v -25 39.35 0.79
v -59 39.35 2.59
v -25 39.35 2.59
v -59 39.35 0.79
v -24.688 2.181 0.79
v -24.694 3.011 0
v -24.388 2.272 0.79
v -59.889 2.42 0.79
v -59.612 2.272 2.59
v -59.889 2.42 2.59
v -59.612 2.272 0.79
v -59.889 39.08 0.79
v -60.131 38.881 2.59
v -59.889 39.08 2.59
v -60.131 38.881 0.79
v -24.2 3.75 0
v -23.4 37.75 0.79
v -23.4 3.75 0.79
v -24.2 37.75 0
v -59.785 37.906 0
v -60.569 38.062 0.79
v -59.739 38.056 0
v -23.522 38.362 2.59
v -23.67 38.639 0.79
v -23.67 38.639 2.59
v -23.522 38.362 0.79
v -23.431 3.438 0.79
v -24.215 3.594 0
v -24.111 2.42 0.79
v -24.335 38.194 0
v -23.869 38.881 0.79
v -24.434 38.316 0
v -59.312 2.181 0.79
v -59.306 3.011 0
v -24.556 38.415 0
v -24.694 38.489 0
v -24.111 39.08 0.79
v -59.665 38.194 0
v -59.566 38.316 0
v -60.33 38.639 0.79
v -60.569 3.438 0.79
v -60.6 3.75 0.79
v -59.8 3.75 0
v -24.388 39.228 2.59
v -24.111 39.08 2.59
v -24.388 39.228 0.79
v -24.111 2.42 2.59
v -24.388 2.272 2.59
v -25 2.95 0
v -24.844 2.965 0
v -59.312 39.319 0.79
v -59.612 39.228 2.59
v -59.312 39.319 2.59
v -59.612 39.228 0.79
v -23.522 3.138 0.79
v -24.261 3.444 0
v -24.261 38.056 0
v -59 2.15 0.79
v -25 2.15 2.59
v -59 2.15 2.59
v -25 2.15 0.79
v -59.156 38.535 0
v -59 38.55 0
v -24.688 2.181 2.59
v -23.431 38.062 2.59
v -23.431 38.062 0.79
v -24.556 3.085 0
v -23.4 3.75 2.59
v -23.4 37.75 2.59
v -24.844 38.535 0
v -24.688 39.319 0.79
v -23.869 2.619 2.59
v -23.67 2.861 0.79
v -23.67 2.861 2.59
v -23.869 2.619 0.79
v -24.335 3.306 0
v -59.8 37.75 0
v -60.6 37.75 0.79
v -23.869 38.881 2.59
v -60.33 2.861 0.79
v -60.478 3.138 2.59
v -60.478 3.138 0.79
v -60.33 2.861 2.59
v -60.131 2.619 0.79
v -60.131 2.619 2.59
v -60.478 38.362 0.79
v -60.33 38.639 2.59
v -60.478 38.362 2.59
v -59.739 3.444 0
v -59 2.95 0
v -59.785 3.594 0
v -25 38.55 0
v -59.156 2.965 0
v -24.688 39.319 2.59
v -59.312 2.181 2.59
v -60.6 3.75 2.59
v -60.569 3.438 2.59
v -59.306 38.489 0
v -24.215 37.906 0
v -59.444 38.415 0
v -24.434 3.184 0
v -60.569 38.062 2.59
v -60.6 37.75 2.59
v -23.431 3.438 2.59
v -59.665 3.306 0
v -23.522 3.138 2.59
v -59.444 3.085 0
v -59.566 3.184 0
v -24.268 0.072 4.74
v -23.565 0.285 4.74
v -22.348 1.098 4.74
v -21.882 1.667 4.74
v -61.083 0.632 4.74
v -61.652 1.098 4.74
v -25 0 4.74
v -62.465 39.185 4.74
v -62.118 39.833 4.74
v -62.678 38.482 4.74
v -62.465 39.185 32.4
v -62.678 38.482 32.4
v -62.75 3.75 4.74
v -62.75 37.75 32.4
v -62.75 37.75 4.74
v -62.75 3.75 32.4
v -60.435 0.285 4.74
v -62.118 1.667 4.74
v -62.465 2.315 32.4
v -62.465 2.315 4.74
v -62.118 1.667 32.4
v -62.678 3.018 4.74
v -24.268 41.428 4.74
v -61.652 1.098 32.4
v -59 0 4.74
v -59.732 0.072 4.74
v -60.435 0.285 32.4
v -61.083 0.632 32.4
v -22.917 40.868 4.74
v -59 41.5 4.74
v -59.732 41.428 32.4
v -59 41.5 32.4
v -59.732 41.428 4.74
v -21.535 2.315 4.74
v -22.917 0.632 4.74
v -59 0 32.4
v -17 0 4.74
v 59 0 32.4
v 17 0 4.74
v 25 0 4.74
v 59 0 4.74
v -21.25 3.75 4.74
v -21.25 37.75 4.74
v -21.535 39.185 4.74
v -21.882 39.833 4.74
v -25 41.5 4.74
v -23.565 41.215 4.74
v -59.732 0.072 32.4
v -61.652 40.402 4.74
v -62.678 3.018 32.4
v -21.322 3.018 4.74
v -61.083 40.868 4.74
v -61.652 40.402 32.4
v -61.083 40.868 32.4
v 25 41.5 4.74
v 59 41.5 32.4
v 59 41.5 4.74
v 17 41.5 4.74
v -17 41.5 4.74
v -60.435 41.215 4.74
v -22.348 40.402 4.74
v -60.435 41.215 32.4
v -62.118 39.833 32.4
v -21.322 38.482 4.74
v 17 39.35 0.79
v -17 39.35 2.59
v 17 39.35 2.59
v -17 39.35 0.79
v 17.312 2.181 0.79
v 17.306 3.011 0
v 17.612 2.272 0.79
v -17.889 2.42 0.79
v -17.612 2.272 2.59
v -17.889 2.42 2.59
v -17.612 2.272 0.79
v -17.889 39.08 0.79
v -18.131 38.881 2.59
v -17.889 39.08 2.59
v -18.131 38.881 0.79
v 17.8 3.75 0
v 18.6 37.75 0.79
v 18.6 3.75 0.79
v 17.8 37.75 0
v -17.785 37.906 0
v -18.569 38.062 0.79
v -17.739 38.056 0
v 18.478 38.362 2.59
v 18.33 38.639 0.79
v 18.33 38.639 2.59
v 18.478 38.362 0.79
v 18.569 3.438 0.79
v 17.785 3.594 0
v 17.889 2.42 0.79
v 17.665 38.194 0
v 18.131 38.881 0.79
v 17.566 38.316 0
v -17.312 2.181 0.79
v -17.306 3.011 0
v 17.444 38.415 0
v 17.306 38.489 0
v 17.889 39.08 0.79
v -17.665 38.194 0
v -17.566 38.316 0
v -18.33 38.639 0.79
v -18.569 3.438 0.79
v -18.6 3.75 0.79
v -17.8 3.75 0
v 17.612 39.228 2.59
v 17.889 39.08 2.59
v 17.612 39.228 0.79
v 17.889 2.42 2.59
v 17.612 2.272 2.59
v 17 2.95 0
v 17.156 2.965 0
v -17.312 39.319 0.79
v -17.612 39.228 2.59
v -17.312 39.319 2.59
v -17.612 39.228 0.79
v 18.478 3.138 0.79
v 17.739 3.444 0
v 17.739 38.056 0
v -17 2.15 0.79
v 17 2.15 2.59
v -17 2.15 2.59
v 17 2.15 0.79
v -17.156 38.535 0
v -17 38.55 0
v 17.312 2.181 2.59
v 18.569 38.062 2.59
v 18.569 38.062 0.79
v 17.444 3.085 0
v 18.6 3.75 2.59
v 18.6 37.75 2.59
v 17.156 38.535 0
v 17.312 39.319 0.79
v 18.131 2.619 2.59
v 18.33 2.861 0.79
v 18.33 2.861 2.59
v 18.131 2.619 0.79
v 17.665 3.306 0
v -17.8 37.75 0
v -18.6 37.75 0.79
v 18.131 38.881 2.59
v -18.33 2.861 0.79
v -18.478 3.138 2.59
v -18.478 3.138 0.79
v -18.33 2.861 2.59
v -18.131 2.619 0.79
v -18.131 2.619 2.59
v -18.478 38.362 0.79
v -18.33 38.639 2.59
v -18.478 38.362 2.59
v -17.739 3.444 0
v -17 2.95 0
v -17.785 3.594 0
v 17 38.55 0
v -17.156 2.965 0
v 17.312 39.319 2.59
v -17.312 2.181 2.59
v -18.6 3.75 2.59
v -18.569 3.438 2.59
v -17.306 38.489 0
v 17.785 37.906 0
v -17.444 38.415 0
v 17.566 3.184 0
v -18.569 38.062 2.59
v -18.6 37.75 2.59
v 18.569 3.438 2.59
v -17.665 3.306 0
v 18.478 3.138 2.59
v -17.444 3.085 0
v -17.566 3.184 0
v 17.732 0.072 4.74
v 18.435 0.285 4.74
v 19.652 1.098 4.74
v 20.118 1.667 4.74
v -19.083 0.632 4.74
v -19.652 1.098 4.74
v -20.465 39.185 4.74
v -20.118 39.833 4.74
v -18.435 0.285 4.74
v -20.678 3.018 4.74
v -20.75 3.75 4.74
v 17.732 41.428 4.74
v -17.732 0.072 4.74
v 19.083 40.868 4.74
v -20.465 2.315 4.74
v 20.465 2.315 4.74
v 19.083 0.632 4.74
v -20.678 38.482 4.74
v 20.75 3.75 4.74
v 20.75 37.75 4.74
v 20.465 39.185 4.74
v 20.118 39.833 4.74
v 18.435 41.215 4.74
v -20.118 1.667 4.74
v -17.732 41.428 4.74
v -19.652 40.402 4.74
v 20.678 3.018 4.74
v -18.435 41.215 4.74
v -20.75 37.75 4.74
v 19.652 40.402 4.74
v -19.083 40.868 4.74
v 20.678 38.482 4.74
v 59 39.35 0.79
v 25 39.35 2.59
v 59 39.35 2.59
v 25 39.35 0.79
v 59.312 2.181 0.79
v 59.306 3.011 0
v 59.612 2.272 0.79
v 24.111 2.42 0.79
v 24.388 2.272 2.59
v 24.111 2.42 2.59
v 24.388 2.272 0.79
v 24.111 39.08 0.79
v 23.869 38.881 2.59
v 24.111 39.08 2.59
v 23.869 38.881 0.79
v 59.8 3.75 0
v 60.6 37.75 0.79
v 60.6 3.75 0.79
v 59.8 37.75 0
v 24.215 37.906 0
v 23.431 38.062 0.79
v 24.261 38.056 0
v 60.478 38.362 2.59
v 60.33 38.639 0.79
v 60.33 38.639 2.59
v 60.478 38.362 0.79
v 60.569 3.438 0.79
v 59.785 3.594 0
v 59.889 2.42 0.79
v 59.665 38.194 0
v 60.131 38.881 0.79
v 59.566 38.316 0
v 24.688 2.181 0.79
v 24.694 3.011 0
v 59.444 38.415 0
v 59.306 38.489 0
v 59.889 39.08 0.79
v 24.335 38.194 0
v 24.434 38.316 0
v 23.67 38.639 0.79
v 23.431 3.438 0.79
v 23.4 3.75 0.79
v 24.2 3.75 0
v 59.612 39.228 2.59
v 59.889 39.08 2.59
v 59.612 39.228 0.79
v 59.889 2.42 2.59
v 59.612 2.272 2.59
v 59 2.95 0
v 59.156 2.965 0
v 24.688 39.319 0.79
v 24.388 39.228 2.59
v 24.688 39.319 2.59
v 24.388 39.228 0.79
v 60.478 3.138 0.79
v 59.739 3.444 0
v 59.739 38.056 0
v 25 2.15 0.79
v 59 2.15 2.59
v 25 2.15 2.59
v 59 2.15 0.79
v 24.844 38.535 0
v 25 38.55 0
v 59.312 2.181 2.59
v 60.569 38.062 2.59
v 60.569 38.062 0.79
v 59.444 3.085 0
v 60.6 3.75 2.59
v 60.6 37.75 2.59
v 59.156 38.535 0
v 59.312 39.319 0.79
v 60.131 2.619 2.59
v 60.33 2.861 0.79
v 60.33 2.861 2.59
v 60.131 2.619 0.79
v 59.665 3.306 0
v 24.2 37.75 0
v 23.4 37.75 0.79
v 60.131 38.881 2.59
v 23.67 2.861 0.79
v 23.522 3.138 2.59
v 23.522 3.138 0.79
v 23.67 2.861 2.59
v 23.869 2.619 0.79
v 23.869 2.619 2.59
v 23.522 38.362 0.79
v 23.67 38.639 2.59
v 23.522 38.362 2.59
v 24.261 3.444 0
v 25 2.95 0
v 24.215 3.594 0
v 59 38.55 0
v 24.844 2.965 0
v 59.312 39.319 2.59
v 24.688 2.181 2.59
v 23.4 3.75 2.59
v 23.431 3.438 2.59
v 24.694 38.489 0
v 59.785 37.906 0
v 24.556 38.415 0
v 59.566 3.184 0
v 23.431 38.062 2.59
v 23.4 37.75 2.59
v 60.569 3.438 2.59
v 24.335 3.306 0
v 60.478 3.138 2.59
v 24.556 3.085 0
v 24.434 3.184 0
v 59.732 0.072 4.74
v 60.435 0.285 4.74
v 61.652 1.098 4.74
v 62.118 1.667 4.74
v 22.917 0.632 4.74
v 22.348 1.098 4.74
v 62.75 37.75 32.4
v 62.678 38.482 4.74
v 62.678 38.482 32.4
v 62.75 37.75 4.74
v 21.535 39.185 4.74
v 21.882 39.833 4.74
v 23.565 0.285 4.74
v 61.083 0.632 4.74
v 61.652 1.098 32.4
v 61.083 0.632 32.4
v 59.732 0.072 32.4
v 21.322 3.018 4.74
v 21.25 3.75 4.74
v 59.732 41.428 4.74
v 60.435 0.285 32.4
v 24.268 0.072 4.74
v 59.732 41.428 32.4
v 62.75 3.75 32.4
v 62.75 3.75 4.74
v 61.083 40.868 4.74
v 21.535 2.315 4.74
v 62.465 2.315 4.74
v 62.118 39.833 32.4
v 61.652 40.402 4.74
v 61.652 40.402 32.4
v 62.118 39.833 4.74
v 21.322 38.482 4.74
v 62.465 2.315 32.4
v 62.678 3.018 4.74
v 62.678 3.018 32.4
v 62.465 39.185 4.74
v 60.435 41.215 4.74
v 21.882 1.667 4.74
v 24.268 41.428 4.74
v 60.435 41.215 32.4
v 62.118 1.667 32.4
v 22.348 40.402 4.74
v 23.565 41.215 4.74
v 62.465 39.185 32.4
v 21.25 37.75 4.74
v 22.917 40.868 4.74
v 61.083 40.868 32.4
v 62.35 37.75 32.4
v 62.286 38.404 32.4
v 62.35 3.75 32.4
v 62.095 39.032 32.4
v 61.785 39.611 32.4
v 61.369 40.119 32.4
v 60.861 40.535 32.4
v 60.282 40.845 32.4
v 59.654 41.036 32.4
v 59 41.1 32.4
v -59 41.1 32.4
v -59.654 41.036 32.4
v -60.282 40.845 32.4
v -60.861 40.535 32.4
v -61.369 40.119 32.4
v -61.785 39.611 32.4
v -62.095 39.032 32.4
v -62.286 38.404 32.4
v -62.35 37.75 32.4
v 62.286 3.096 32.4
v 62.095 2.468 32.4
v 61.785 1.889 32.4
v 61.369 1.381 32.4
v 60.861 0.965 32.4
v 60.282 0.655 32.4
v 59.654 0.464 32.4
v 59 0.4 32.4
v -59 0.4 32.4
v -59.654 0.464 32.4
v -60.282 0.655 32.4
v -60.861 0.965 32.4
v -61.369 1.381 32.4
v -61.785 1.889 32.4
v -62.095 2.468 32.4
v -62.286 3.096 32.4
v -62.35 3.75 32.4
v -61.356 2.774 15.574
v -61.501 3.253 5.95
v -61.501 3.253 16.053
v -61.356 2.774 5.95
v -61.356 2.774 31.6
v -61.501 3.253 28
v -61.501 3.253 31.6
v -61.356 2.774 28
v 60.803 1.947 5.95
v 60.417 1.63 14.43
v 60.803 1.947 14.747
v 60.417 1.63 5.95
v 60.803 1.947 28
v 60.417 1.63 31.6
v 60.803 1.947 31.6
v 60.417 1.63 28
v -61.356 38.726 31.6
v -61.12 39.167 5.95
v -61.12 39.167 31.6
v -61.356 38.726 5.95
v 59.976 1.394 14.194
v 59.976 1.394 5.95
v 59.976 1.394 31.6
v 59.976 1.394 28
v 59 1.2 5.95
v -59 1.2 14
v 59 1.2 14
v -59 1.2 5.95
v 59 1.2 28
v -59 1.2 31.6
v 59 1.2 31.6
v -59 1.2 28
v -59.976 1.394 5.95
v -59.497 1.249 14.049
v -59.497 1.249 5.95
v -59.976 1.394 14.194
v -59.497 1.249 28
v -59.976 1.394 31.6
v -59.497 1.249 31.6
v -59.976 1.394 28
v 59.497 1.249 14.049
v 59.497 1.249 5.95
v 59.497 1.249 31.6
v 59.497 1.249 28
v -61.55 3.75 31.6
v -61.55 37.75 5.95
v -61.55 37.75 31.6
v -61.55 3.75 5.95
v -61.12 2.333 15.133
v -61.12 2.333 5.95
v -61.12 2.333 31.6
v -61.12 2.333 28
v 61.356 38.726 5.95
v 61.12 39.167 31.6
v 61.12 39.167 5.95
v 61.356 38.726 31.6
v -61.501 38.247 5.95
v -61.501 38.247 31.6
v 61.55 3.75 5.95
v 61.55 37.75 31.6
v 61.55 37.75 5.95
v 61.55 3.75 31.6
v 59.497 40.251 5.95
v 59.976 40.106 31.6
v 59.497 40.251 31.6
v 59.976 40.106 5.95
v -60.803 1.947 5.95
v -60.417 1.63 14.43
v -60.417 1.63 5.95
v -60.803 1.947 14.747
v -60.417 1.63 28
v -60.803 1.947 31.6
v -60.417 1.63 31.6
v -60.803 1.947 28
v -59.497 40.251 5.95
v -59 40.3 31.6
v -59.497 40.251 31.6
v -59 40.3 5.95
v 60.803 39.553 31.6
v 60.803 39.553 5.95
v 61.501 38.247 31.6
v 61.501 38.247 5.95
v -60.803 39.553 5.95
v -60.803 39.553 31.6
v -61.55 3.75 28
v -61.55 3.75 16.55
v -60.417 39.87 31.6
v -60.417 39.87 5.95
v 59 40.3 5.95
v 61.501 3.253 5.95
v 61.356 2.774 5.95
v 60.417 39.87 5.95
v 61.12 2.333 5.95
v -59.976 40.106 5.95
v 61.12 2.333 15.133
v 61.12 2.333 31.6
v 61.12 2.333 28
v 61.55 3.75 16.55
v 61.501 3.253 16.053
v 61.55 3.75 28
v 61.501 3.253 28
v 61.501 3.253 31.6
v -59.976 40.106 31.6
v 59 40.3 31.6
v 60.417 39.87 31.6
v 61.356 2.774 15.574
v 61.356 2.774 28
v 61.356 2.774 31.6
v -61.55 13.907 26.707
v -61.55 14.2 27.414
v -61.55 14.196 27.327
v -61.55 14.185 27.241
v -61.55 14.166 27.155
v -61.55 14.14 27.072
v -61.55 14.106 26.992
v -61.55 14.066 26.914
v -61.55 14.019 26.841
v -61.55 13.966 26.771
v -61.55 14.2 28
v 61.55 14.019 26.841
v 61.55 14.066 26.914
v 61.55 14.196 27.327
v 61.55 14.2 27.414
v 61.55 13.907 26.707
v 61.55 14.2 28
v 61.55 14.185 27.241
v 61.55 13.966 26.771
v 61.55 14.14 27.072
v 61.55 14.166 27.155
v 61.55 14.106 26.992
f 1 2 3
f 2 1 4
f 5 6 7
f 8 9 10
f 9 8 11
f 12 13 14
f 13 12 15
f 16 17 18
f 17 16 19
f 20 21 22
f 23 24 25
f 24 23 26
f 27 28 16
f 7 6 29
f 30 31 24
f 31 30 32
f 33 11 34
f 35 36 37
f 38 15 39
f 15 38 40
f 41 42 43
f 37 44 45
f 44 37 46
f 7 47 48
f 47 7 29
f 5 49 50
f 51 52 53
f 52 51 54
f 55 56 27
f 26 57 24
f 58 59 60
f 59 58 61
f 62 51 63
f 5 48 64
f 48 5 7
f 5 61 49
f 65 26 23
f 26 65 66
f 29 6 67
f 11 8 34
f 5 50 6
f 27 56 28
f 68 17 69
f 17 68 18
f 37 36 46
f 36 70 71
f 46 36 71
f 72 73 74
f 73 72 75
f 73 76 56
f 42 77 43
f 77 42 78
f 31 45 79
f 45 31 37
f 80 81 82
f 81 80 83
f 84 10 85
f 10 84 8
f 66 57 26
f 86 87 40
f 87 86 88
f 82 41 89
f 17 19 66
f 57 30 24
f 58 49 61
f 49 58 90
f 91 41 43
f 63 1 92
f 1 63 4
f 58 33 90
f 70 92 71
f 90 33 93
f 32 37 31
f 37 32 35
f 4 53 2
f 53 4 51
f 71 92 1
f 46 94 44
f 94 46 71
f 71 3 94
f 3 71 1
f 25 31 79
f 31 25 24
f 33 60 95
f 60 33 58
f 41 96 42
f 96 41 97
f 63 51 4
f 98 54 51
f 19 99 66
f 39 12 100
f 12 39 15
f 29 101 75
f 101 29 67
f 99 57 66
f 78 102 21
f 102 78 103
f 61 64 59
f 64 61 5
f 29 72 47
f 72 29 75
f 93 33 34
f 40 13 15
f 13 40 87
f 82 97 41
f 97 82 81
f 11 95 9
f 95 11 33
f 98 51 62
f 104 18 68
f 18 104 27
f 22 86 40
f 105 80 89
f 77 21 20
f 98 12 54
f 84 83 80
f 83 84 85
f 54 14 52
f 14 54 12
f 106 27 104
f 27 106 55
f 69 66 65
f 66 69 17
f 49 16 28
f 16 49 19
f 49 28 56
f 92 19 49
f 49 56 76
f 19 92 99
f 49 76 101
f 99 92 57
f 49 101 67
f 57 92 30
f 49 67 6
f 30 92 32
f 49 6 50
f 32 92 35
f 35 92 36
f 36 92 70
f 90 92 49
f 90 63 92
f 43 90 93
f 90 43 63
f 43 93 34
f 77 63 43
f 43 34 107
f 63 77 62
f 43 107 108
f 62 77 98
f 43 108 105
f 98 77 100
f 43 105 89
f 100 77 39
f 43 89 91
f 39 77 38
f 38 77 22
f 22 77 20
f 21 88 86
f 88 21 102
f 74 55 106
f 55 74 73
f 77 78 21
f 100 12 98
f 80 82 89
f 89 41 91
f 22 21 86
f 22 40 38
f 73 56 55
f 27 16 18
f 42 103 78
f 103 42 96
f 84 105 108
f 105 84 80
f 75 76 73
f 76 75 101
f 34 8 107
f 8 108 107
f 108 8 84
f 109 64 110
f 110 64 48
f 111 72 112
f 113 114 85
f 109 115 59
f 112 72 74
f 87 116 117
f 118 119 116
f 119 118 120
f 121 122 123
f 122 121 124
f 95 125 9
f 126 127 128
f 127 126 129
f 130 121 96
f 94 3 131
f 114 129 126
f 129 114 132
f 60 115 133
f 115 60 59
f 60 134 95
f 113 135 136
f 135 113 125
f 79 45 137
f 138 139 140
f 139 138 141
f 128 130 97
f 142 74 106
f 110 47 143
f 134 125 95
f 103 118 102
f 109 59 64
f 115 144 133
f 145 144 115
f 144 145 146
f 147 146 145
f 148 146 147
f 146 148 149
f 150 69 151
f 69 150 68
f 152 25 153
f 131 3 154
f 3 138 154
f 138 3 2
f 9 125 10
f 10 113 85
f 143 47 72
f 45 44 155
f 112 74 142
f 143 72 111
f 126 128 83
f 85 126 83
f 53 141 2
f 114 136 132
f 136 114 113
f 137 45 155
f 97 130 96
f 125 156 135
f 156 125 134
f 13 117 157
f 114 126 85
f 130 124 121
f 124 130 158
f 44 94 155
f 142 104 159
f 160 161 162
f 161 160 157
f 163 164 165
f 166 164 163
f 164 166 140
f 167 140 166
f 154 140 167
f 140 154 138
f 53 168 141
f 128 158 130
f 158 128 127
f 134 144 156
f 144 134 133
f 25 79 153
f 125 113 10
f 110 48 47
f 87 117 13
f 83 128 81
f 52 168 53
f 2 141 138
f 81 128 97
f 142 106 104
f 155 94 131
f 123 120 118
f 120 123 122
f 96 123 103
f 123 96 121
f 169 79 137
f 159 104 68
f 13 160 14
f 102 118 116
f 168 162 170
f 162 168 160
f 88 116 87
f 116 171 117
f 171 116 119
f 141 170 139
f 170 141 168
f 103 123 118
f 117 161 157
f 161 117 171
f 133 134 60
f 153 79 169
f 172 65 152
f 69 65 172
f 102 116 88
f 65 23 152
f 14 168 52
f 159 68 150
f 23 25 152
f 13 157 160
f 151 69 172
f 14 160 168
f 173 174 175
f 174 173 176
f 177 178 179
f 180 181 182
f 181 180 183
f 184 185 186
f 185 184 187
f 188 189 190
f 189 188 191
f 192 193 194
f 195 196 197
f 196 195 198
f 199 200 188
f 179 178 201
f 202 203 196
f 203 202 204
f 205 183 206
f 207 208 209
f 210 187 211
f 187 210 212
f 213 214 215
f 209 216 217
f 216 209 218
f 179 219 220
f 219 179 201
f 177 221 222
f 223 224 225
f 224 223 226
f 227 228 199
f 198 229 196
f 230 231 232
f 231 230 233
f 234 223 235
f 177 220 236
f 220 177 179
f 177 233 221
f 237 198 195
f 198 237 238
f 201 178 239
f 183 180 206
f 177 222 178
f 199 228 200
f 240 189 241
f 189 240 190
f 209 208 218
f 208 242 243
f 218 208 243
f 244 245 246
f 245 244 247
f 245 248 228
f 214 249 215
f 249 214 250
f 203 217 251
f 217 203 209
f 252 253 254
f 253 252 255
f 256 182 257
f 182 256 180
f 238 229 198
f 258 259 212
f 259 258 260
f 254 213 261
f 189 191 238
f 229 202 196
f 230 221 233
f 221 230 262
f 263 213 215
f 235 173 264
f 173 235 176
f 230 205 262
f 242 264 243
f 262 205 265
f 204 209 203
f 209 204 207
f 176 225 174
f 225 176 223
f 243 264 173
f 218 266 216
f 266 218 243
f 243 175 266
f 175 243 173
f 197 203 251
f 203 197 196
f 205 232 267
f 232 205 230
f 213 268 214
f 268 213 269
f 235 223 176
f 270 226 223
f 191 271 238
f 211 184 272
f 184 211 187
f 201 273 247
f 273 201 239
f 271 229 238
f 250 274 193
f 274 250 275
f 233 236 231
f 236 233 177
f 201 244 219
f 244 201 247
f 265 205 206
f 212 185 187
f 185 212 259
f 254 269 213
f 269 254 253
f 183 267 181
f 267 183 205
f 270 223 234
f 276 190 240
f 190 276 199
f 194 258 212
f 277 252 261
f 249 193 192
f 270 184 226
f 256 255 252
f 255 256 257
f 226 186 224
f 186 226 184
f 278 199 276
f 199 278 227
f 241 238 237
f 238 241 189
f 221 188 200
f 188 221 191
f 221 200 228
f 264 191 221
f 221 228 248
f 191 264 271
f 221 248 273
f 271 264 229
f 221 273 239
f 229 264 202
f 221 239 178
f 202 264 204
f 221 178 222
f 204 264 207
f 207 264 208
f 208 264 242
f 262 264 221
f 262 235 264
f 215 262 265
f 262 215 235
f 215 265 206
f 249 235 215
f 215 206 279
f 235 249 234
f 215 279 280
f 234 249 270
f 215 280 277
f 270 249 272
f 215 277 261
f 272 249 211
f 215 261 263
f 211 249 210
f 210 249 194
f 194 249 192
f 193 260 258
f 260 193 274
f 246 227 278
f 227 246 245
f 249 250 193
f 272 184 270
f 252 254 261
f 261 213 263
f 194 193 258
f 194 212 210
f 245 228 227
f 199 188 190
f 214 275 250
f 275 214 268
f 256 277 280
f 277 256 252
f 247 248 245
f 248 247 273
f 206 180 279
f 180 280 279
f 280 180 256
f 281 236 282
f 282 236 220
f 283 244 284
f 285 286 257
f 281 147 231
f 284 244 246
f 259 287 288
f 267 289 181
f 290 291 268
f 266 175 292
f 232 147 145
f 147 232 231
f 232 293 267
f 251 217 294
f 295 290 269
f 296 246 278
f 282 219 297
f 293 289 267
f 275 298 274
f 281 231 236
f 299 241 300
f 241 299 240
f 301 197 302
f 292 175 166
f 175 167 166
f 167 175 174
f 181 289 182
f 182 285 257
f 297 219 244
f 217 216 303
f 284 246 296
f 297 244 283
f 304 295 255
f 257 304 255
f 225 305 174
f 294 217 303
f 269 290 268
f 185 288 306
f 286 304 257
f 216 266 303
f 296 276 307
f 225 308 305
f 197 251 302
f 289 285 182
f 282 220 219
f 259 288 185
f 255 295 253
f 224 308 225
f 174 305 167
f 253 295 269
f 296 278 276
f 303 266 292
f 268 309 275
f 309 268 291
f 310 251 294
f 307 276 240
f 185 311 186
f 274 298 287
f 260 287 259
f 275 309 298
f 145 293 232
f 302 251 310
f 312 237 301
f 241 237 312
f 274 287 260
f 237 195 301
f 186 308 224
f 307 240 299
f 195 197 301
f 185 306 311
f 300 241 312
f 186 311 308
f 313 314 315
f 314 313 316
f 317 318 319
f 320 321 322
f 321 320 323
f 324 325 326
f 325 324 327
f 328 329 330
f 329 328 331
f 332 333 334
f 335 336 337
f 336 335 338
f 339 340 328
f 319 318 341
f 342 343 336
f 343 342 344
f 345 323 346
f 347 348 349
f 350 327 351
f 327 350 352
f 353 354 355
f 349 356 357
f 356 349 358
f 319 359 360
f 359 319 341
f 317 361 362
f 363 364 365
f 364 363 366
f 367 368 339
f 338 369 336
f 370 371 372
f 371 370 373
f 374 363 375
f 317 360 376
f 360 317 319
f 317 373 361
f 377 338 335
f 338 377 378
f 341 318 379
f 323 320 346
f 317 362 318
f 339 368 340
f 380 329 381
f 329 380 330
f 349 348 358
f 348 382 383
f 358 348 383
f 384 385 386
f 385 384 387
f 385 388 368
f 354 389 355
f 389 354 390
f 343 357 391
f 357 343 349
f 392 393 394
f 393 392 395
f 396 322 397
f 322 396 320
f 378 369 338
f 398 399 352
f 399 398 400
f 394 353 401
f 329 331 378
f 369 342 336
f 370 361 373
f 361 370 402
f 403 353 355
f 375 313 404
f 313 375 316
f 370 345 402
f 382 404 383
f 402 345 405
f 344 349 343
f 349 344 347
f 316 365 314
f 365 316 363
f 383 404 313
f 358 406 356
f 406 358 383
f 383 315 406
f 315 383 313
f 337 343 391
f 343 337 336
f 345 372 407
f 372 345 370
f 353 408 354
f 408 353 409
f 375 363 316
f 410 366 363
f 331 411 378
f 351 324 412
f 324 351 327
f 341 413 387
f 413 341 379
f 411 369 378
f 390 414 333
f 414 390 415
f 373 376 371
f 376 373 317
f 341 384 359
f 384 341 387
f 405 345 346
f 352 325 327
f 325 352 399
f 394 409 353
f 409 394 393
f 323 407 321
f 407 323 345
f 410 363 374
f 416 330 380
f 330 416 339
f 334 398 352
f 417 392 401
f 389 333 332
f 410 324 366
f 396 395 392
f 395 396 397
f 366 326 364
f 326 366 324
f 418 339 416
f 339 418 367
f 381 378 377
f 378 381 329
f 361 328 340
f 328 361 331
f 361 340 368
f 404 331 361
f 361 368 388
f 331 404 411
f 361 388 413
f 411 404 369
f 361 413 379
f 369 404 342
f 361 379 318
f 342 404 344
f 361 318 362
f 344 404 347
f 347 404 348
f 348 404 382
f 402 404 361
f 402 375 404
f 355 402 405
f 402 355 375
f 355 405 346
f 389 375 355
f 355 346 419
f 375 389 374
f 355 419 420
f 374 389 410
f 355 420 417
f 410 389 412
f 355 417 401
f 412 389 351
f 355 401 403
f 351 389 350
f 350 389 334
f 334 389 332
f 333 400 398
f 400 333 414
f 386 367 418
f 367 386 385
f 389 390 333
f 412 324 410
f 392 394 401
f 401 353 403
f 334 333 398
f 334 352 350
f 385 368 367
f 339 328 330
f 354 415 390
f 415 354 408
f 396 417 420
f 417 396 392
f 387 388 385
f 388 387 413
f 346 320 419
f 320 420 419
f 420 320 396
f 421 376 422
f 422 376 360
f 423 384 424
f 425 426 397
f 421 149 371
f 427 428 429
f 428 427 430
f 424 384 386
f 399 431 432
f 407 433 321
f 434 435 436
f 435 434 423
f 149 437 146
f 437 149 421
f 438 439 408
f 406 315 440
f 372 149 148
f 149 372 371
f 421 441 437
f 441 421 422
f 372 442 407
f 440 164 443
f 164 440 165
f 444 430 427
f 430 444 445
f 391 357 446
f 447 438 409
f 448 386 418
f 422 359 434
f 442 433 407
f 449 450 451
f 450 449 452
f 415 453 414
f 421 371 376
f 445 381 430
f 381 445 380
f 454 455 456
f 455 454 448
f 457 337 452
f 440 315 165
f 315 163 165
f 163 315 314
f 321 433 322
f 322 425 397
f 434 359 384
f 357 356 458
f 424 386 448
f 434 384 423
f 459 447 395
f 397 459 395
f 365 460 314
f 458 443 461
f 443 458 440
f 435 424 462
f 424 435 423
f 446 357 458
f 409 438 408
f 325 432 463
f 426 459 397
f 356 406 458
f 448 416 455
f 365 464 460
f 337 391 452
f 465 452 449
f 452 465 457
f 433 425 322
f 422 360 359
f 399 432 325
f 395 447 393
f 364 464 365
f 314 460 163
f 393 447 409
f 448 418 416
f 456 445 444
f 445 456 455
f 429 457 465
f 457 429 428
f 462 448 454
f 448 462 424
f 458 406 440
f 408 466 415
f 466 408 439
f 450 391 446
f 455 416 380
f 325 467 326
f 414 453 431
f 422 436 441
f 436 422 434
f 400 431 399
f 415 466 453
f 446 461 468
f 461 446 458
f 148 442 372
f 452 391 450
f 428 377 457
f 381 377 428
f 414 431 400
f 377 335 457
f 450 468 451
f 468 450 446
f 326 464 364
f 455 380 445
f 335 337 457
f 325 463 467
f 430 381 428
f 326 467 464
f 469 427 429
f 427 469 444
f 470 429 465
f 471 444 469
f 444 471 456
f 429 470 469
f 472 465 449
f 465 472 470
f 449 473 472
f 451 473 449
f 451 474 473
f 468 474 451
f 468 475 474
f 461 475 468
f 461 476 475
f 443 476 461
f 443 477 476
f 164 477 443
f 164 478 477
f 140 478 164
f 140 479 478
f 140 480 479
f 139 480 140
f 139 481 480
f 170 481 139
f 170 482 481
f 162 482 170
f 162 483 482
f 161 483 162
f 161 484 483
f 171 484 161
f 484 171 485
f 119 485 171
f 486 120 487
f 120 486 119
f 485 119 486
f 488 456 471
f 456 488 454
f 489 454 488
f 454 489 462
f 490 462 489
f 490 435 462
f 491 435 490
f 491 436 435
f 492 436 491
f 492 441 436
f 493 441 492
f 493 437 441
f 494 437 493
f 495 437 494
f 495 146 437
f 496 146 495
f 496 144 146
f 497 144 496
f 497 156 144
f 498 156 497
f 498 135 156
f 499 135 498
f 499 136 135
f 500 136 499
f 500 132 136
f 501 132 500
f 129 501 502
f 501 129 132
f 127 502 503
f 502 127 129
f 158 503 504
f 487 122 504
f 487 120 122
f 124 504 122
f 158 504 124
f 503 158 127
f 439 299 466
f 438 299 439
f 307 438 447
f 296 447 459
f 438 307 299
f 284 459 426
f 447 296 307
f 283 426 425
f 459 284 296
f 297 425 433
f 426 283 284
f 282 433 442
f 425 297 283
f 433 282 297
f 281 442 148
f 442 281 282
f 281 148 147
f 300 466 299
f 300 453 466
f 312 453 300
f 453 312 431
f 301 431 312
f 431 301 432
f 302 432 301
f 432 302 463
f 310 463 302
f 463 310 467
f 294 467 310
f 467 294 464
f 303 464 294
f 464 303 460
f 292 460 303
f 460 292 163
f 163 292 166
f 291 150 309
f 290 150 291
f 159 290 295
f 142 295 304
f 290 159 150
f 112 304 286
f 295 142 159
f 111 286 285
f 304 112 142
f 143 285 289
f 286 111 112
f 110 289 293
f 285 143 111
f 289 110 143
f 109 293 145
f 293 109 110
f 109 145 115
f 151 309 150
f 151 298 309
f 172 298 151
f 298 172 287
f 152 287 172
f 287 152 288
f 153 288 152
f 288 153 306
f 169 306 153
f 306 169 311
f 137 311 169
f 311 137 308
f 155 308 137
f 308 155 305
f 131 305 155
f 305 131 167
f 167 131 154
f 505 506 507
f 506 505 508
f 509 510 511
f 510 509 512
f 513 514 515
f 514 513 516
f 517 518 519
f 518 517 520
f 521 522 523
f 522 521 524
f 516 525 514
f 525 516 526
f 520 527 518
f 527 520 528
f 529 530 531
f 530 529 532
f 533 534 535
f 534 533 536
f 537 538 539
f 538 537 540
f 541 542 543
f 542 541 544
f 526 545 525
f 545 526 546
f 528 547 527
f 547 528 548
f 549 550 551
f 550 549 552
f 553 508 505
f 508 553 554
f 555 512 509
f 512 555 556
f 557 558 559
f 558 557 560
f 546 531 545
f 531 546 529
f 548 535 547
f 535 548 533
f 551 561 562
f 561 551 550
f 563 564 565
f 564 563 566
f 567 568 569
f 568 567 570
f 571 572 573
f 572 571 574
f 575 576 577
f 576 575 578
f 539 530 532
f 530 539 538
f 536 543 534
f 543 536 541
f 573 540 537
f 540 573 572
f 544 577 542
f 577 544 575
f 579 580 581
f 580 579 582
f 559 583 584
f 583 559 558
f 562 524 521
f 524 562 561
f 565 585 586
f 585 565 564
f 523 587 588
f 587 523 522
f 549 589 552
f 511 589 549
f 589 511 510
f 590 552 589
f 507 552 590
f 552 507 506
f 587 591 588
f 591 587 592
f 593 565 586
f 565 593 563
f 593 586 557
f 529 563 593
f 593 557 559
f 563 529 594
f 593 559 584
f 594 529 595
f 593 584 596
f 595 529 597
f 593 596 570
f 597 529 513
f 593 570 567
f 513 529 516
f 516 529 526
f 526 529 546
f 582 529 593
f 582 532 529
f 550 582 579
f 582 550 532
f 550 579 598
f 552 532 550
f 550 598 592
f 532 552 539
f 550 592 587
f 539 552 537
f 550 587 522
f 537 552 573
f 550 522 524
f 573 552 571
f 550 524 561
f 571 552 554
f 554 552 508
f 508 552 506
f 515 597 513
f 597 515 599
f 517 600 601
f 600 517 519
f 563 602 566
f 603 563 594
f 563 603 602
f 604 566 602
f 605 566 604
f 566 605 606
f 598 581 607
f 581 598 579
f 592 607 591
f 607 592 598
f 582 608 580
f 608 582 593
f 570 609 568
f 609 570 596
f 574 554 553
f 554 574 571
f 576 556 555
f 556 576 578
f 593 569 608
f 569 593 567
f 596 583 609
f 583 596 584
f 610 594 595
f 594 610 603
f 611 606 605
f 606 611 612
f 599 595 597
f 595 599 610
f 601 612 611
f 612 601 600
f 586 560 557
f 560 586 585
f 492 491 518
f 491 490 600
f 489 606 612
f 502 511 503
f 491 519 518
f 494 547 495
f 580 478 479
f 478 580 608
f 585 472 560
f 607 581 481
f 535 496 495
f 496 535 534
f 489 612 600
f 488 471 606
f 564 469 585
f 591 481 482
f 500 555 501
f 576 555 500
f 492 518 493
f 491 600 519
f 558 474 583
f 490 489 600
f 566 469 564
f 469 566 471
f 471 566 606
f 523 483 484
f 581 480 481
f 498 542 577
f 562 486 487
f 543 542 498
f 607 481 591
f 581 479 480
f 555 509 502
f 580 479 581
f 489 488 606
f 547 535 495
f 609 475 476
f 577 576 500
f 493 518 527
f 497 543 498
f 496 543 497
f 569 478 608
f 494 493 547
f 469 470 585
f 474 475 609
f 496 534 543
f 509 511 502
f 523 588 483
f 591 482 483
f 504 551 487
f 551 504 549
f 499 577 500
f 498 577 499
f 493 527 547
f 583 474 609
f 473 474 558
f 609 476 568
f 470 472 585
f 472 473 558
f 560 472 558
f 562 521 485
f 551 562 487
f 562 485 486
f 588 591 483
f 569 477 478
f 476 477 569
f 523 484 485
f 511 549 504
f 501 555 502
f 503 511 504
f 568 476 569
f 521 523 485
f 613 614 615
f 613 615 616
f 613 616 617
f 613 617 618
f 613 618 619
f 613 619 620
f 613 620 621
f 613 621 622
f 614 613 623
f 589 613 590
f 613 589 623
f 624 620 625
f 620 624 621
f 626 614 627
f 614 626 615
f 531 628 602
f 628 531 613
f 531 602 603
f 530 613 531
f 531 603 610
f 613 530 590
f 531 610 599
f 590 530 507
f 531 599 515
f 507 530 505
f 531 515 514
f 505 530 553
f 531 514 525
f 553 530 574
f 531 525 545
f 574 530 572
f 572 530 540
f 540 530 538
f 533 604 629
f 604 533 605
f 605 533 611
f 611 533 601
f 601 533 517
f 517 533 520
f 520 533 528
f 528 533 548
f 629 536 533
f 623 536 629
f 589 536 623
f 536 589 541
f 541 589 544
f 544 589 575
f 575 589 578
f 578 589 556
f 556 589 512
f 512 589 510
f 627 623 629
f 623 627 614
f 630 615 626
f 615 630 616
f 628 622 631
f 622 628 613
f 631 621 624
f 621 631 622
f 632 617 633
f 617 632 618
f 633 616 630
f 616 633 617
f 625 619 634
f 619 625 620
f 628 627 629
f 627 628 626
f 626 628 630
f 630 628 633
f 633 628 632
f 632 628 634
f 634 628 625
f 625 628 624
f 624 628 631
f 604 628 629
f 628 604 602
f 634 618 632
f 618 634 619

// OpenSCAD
// file: ../../../modules/gridfinity.scad
// Gridfinity ベースプレートの共有 module。
// 寸法は Gridfinity 仕様 (Zack Freedman) の baseplate 輪郭に従う:
//   ピッチ 42、ソケット上端開口 41.5 (角 R4)、上から 45° 面取り 2.15 →
//   垂直 1.8 (37.2 角・R1.85) → 45° 面取り 0.7 → 底 35.8 角 (R1.15)。
//   ソケット深さ = 2.15 + 1.8 + 0.7 = 4.65。
//
// 座標系: X が列方向 (中央が 0)、Y が行方向 (板の前端が 0)、Z=0 が板の底面。
// 板の外形は grid とは独立に rim で与えるので、grid より大きい板 (縁付き) を
// 作れる。ソケットは rim=[left, right, front, back] の内側へ 42 ピッチで並ぶ。

gf_pitch = 42;
gf_socket_top = 41.5; // 上端開口
gf_socket_mid = 37.2; // 垂直部
gf_socket_bot = 35.8; // 底
gf_socket_r_top = 4;
gf_socket_r_mid = 1.85;
gf_socket_r_bot = 1.15;
gf_chamfer_top = 2.15;
gf_wall_h = 1.8;
gf_chamfer_bot = 0.7;
gf_socket_depth = gf_chamfer_top + gf_wall_h + gf_chamfer_bot; // 4.65
gf_fn = 32;
gf_eps = 0.01; // hull 用の薄板の厚さ
gf_over = 0.5; // 切削の抜き代

// 角丸正方形または矩形 (w は一辺、または [幅, 奥行き]、角 R)
module
gf_rounded_square(w, r)
{
    offset(r = r, $fn = gf_fn)
        square(is_list(w) ? w - [ 2 * r, 2 * r ] : w - 2 * r, center = true);
}

// 厚さ gf_eps の角丸正方形の薄板を z に置く (hull の骨)
module
gf_slab(w, r, z)
{
    translate([ 0, 0, z ]) linear_extrude(gf_eps) gf_rounded_square(w, r);
}

// ソケット1個の切削体。z=0 がソケットの底 (床の天面)、+Z へ 4.65 で天面に出る。
// clearance は嵌合の逃げで、輪郭を全周へ clearance だけ外へ出す (幅 +2c、角 R
// +c)。pitch_x は X 方向のセル幅。端数でも角 R と面取りの寸法を保つ。
module
gf_socket_cut(clearance = 0, pitch_x = gf_pitch)
{
    z1 = gf_chamfer_bot;
    z2 = z1 + gf_wall_h;
    z3 = gf_socket_depth;
    c = clearance;
    assert(pitch_x > gf_pitch - gf_socket_top + 2 * gf_socket_r_top,
           "Cell width is too small for the socket corner radius");
    delta = [ pitch_x - gf_pitch, 0 ];
    bot = [ gf_socket_bot + 2 * c, gf_socket_bot + 2 * c ] + delta;
    mid = [ gf_socket_mid + 2 * c, gf_socket_mid + 2 * c ] + delta;
    top = [ gf_socket_top + 2 * c, gf_socket_top + 2 * c ] + delta;
    hull()
    {
        gf_slab(bot, gf_socket_r_bot + c, 0);
        gf_slab(mid, gf_socket_r_mid + c, z1 - gf_eps);
    }
    hull()
    {
        gf_slab(mid, gf_socket_r_mid + c, z1 - gf_eps);
        gf_slab(mid, gf_socket_r_mid + c, z2 - gf_eps);
    }
    hull()
    {
        gf_slab(mid, gf_socket_r_mid + c, z2 - gf_eps);
        gf_slab(top, gf_socket_r_top + c, z3 - gf_eps);
    }
    // 天面より上へ抜く (天面と同一平面の退化した面を残さない)
    gf_slab(top, gf_socket_r_top + c, z3 - gf_eps);
    translate([ 0, 0, z3 - gf_eps ]) linear_extrude(gf_over + gf_eps)
        gf_rounded_square(top, gf_socket_r_top + c);
}

// ベースプレート。cols x rows のソケットを床 floor_t の上に彫る。
// rim = [left, right, front, back] はソケット列の外側に残す縁の幅。
// 板の幅 = cols*42 + left + right、奥行き = rows*42 + front + back。
// cols の端数は左端の細幅セルになる。rows は正の整数。
// clearance はソケットの嵌合の逃げ (gf_socket_cut を参照)。
module
gf_baseplate(cols, rows, rim = [ 0, 0, 0, 0 ], floor_t = 1, clearance = 0)
{
    grid_w = cols * gf_pitch;
    grid_d = rows * gf_pitch;
    plate_w = grid_w + rim[0] + rim[1];
    plate_d = grid_d + rim[2] + rim[3];
    x0 = -plate_w / 2 + rim[0]; // ソケット列の左端
    first_pitch = grid_w - (ceil(cols) - 1) * gf_pitch;
    difference()
    {
        translate([ -plate_w / 2, 0, 0 ])
            cube([ plate_w, plate_d, floor_t + gf_socket_depth ]);
        for (c = [0:ceil(cols) - 1], r = [0:rows - 1])
            translate([
                x0 + (c == 0 ? first_pitch / 2
                             : first_pitch + (c - 0.5) * gf_pitch),
                rim[2] + (r + 0.5) * gf_pitch,
                floor_t
            ]) gf_socket_cut(clearance, c == 0 ? first_pitch : gf_pitch);
    }
}
// file: ../../../modules/gridfinity_bins.scad
include <gridfinity_bin.scad>

// assets/gridfinity-bin/ の bin 群の共通値と、サイズ 3 引数の払い出し口。
// 単体では何も描かない。設計の経緯と確定値は
// ledger/designs/gridfinity-bin-4u.md が正本。
// 通常binは4U/9U、X={1,1.5,2,2.5,3} × Y={1,2,3,4,5,5.5}。
// 両軸に端数を持つ組み合わせはassetに置かない（各高さ28種）。
// Xが横、Yがラベルの壁から奥、unitsが高さ（7mm単位）。
wall = 1.2;    // 0.4 ノズル 3 本
floor_t = 1.2; // 底 (4.75) の上に載せる床。床の天面 z = 5.95
label_d = 13;  // 12mm 幅のラベルシールを貼る天板の張り出し
label_t = 1; // 天板の厚さ (user 指定)。下は 45° の無垢のくさび
label_r = 1; // 天板の先端と 45° 面の境目の R (user 指定)
// カードケース (goods/card_case_2x3x4u.scad) の値。カードは ISO/IEC 7810 ID-1 (85.6 × 54 ×
// 0.76、隅 R3) で、長辺を Y (rows 方向) に寝かせ、X 中央・手前の壁から 10 奥に置く。ポケットは
// カードより 1 大きい (片側 0.5)。右奥のマスは壁の内面まで抜き、床と底を外形に平行な 45° の窪みにする。
// ポケットの左右の埋めの天面 (幅 13.05) が 12mm のラベルを貼る帯。ポケットと穴の交点の
// 縦エッジは丸める (開口の上縁は丸めない: 壁を上端まで垂直に保ち、収まる枚数を減らさない)
card_w = 54;    // カードの短辺 (X)。user 指定「高さ 54」
card_d = 85.6;  // カードの長辺 (Y)。user 指定「幅 85.6」
card_clear = 1; // ポケットの余裕 (user 指定「+1mm」)
// ポケットの手前の辺の、手前の壁の内面からの距離 (user 指定「10mm」)
card_off = 10;
// ポケットの平面の隅 R (user 指定「角の丸み 3mm」。ID-1 の隅は 2.88..3.48)
card_r = 3;
// ポケットと穴が交わる所の、埋めの凸の縦エッジの R (指の当たる角)
card_edge_r = 2;
recess_skin = floor_t + 1.75; // 窪みの床 z (底の皮)。user 指定「壁厚と同じ 1.2 は過剰、1.75 返す」

function bin_contract(cols, rows, units) = str("CONTRACT units=",
                                               units,
                                               " pitch=",
                                               gf_pitch,
                                               " outer=",
                                               gfb_outer,
                                               " h=",
                                               units* gfb_unit,
                                               " lip=",
                                               gfb_lip_h,
                                               " base=",
                                               gfb_base_bot,
                                               "/",
                                               gfb_base_mid,
                                               "/",
                                               gfb_outer,
                                               " base_h=",
                                               gfb_base_h,
                                               " wall=",
                                               wall,
                                               " floor_top=",
                                               gfb_base_h + floor_t,
                                               " label=",
                                               label_d,
                                               "x",
                                               label_t,
                                               " wedge=45 fillet=",
                                               label_r,
                                               " bin=",
                                               cols,
                                               "x",
                                               rows,
                                               " size=",
                                               cols* gf_pitch - 0.5,
                                               "x",
                                               rows* gf_pitch - 0.5);

// (cols, rows, units) でラベル付き bin を払い出す。例: gridfinity_bin(2, 4, 4)
module
gridfinity_bin(cols, rows, units = 4)
{
    echo(bin_contract(cols, rows, units));
    gfb_bin(cols, rows, units, wall, floor_t, label_d, label_t, label_r);
}

function card_contract(cols, rows, units) = str("CONTRACT card units=",
                                                units,
                                                " bin=",
                                                cols,
                                                "x",
                                                rows,
                                                " size=",
                                                cols* gf_pitch - 0.5,
                                                "x",
                                                rows* gf_pitch - 0.5,
                                                " h=",
                                                units* gfb_unit,
                                                " lip=",
                                                gfb_lip_h,
                                                " floor_top=",
                                                gfb_base_h + floor_t,
                                                " card=",
                                                card_w,
                                                "x",
                                                card_d,
                                                " pocket=",
                                                card_w + card_clear,
                                                "x",
                                                card_d + card_clear,
                                                " at=",
                                                -(card_w + card_clear) / 2,
                                                ",",
                                                wall + card_off,
                                                " hole=",
                                                (cols - 1) / 2 * gf_pitch - gfb_outer / 2,
                                                ",",
                                                (rows - 0.5) * gf_pitch - 0.25 - gfb_outer / 2,
                                                " hole_r=",
                                                gfb_outer_r - wall,
                                                " recess=",
                                                gfb_outer - 2 * wall,
                                                "/",
                                                gfb_base_mid - 2 * wall,
                                                " recess_floor=",
                                                recess_skin,
                                                " r=",
                                                card_r,
                                                " edge_r=",
                                                card_edge_r);

// (cols, rows, units) でカードケースを払い出す。例: gridfinity_card_case(2, 3, 4)
module
gridfinity_card_case(cols, rows, units = 4)
{
    echo(card_contract(cols, rows, units));
    gfb_card_case(cols,
                  rows,
                  units,
                  wall,
                  floor_t,
                  [ card_w, card_d ],
                  card_clear,
                  card_off,
                  card_r,
                  recess_skin,
                  card_edge_r);
}
// main file
include <../../../modules/gridfinity_bins.scad>

gridfinity_bin(3, 1, 4);
